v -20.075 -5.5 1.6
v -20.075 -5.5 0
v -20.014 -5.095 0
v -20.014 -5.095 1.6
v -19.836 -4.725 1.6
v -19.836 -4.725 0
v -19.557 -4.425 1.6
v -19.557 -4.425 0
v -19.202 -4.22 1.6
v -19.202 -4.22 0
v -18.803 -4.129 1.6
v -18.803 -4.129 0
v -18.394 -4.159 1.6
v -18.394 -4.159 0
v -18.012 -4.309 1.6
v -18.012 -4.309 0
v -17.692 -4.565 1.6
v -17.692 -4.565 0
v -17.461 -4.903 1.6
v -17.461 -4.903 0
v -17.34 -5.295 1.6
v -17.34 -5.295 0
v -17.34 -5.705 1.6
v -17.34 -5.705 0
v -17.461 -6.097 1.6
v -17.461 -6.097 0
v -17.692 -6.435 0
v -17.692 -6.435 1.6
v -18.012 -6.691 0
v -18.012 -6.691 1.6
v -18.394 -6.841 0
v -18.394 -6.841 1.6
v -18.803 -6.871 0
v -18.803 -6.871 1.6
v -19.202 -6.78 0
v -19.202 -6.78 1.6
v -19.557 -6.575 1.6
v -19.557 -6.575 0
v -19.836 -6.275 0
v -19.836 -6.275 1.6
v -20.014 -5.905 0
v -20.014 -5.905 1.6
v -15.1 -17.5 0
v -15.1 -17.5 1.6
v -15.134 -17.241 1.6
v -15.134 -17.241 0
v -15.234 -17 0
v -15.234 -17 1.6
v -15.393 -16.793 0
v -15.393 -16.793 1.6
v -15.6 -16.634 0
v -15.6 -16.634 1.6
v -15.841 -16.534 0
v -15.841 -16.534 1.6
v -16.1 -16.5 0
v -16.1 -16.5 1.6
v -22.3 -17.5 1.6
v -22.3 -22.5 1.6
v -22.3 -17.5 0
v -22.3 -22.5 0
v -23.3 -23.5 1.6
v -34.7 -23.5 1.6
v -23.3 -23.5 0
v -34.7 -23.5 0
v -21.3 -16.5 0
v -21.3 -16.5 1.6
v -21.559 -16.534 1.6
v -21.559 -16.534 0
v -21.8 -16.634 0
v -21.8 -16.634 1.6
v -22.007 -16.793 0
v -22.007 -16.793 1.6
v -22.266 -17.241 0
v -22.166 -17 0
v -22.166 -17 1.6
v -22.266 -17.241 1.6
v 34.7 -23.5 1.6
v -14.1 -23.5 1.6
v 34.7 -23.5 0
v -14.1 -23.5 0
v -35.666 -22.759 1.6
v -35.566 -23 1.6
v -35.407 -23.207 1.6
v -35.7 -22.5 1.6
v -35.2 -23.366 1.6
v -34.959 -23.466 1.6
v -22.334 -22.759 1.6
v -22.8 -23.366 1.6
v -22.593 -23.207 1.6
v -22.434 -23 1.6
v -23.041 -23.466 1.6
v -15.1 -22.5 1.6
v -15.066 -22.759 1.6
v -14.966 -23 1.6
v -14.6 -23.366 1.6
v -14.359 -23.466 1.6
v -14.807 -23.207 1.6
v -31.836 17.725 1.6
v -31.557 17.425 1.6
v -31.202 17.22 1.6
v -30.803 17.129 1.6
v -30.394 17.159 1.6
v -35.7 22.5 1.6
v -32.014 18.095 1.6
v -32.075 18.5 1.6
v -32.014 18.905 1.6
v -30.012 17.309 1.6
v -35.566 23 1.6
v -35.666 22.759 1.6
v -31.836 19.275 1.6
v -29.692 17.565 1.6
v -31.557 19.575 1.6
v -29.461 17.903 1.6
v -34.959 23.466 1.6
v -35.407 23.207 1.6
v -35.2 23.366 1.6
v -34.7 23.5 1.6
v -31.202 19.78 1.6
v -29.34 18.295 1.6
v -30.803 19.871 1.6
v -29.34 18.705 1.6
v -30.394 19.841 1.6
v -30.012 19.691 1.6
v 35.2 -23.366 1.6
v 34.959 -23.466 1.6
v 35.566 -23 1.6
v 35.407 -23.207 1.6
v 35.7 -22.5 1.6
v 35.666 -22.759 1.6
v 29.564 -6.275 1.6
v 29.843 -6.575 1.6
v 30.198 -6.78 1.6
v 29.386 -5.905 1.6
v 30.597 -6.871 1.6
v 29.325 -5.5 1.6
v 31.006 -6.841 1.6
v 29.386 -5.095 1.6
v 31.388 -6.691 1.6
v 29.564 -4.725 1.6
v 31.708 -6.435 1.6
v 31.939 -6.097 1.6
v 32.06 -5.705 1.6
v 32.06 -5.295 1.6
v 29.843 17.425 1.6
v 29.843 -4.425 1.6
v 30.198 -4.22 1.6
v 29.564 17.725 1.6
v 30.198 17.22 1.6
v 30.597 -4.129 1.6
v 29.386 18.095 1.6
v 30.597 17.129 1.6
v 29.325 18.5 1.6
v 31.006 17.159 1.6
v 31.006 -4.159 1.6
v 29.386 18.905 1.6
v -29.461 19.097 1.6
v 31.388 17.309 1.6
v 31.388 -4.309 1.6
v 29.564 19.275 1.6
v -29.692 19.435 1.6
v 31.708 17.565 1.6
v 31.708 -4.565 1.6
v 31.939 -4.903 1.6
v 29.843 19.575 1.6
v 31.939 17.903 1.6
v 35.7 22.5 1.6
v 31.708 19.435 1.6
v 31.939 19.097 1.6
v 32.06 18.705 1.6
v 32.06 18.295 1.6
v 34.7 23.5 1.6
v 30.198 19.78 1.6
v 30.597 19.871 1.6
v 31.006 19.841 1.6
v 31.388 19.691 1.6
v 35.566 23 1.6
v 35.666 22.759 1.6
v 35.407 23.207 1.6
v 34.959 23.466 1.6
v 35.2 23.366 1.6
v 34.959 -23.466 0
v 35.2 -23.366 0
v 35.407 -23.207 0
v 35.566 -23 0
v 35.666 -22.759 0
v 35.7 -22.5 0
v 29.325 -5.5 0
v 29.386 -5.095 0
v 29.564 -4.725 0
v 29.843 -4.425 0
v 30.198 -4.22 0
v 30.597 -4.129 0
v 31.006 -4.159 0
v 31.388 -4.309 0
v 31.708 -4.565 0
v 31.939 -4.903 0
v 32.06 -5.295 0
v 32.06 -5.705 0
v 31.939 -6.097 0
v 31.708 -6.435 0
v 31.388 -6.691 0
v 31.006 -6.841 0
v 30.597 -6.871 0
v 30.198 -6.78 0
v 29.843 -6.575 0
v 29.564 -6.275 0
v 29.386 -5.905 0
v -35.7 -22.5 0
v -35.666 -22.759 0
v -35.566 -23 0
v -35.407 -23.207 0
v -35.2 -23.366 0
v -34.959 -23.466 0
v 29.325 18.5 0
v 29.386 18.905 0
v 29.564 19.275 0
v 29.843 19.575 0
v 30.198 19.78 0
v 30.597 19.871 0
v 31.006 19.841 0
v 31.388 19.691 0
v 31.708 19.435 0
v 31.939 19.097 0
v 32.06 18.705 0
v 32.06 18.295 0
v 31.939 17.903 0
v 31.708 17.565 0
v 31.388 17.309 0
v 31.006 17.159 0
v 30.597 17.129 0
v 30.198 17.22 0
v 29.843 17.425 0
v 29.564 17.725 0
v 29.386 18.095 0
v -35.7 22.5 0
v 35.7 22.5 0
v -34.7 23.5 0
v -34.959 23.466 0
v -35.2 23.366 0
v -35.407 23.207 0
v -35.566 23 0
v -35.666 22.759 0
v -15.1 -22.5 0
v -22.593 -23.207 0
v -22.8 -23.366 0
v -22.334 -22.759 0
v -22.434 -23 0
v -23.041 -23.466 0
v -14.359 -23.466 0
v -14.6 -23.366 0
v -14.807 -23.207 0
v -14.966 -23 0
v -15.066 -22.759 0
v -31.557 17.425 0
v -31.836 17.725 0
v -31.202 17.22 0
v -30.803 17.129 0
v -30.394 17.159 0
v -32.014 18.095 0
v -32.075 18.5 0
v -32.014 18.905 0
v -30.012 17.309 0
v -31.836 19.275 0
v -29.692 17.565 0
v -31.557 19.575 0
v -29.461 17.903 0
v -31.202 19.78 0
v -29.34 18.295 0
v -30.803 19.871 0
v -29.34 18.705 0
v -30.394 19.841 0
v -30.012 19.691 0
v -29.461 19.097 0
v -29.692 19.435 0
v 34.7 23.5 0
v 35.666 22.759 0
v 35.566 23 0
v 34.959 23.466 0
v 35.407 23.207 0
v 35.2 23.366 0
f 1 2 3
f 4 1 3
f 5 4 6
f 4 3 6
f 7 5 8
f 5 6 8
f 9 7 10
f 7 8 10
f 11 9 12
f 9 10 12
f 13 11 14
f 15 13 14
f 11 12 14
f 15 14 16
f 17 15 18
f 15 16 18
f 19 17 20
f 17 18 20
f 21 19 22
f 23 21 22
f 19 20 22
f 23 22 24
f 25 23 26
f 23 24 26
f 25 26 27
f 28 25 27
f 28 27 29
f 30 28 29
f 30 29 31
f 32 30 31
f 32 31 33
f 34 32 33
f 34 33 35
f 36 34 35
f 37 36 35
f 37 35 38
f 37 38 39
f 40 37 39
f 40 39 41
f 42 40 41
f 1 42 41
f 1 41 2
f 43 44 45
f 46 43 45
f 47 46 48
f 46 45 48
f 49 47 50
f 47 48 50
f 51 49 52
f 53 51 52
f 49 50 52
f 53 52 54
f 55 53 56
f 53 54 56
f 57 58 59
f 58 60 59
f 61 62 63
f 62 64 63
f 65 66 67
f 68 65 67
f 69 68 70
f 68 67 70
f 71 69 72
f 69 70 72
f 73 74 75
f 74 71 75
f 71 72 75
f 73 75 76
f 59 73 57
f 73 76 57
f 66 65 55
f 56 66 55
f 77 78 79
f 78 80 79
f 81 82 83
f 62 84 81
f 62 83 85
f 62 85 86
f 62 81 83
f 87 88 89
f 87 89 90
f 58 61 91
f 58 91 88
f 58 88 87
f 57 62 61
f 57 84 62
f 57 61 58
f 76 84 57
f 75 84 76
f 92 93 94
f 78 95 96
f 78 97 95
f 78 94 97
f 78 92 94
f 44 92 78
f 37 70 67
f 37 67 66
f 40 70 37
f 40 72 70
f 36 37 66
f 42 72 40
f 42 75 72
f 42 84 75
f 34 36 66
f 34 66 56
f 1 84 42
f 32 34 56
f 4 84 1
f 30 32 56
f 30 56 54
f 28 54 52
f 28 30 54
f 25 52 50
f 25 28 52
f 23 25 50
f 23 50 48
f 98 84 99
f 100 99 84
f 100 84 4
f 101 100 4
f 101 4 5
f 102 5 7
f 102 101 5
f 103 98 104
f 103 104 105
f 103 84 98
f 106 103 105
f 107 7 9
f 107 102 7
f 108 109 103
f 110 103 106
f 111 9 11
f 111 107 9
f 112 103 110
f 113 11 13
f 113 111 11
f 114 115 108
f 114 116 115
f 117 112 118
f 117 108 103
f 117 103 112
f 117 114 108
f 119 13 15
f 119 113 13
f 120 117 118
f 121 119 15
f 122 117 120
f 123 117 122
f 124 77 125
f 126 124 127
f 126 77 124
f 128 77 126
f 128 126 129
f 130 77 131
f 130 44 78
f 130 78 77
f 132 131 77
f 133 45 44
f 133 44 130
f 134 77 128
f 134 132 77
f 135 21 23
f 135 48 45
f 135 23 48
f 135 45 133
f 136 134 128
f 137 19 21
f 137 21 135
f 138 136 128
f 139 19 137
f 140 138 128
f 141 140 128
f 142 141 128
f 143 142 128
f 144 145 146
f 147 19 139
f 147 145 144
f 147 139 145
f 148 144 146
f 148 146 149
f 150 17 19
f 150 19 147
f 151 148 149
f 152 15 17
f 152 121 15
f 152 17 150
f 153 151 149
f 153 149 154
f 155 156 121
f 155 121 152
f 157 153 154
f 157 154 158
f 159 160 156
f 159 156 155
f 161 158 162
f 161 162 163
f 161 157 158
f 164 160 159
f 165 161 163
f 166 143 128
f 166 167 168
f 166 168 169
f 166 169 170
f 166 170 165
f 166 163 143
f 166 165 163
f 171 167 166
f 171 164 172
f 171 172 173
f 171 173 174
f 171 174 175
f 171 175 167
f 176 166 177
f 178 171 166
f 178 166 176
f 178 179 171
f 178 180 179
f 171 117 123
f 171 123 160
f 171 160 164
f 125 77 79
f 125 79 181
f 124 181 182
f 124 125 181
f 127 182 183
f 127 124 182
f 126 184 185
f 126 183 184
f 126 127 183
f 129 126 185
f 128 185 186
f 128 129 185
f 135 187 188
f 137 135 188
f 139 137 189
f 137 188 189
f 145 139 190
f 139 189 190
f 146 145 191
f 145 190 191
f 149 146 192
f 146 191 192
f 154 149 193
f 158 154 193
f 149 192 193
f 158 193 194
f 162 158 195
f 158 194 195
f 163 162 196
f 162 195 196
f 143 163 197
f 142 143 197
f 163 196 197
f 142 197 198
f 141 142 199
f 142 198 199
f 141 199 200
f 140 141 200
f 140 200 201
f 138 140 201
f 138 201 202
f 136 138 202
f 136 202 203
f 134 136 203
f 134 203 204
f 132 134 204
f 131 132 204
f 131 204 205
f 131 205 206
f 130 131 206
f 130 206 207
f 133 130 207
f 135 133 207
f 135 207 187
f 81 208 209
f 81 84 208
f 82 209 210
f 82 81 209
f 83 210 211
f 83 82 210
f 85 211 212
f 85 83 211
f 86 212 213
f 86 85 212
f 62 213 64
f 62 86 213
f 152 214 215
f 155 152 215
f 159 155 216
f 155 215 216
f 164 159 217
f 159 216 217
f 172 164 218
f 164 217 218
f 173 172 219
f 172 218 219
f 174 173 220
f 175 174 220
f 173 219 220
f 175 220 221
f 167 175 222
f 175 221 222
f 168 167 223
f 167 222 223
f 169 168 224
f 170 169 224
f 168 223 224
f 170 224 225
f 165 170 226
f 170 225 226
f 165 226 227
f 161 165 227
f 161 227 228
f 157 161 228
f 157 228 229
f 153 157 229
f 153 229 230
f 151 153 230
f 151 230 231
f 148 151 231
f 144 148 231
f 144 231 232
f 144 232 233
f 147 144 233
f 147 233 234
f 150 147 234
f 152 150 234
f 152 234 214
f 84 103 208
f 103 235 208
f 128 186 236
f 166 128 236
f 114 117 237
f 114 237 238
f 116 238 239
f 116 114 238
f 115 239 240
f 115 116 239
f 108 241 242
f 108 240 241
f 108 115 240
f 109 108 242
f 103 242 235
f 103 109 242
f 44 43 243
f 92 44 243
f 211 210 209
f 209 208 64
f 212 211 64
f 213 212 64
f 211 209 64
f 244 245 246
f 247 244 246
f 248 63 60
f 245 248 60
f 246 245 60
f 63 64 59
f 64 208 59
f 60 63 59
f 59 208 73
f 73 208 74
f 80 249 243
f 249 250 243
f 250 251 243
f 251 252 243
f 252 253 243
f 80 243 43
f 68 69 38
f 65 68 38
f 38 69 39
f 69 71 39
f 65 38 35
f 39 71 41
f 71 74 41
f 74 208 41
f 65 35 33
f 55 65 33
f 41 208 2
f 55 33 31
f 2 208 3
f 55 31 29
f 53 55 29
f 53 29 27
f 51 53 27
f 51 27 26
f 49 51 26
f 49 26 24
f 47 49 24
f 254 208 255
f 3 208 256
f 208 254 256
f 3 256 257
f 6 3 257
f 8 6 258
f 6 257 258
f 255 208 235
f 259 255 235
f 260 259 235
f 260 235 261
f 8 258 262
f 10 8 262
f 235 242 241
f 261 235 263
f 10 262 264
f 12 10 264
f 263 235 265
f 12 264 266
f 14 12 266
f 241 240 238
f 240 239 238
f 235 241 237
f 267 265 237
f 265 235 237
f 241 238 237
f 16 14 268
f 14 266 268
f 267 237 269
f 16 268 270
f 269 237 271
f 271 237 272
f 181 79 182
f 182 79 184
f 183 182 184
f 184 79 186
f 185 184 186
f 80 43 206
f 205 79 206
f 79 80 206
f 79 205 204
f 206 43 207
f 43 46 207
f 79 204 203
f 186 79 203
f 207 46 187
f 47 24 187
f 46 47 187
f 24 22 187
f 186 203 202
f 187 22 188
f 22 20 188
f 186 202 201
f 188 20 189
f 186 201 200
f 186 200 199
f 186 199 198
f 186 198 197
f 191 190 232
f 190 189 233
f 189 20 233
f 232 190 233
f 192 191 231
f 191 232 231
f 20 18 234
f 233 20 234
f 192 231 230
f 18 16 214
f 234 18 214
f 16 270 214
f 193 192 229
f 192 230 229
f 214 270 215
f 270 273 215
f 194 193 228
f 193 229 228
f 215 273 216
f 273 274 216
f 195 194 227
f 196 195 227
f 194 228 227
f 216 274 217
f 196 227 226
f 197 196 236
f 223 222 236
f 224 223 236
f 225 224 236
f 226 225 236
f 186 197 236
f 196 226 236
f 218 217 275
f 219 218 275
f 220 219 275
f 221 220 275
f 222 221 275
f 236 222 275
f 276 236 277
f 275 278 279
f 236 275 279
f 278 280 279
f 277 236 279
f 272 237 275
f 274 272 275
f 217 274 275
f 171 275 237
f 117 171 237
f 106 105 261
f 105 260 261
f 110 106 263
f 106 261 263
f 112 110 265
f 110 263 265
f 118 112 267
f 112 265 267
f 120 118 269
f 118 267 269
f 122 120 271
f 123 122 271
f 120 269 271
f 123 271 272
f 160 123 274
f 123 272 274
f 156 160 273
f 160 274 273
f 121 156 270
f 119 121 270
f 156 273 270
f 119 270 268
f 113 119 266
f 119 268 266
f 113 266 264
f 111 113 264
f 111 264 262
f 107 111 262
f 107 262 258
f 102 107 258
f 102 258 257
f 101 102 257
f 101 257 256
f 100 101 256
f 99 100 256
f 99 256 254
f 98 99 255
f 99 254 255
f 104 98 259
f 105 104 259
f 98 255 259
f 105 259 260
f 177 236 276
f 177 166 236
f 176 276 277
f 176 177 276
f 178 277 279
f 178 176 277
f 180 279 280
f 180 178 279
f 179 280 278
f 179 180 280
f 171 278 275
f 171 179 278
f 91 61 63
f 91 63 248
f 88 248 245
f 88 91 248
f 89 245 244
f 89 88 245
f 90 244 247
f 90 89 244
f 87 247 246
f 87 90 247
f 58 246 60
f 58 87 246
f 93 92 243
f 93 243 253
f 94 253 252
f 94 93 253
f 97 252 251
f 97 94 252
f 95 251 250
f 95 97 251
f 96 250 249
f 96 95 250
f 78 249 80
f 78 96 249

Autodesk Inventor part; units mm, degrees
ref_plane "YZ Plane" through (0, 0, 0) normal (1, 0, 0) x (0, 1, 0)
ref_plane "XZ Plane" through (0, 0, 0) normal (0, 1, 0) x (-1, 0, 0)
ref_plane "XY Plane" through (0, 0, 0) normal (0, 0, 1) x (1, 0, 0)
sketch "Sketch1" plane through (0, 0, 0) normal (0, 0, 1) x (1, 0, 0)
  line L0 (-35.7, -23.5) -> (35.7, -23.5)
  line L1 (35.7, -23.5) -> (35.7, 23.5)
  line L2 (35.7, 23.5) -> (-35.7, 23.5)
  line L3 (-35.7, 23.5) -> (-35.7, -23.5)
  line L4 (-35.7, -23.5) -> (35.7, 23.5) construction
  line L5 (35.7, -23.5) -> (-35.7, 23.5) construction
  point P0 (0, 0)
  dimension "d0" = 47
  dimension "d1" = 71.4
extrude "Extrusion1" add sketch "Sketch1" along normal blind 1.6
sketch "Sketch2" plane through (0, 0, 0) normal (0, 0, -1) x (-1, 0, 0)
  line L0 (35.7, -23.5) -> (-35.7, -23.5) projected
  line L1 (35.7, -23.5) -> (-35.7, -23.5) projected
  line L2 (15.1, -23.5) -> (22.3, -23.5)
  line L3 (22.3, -23.5) -> (22.3, -16.5)
  line L4 (22.3, -16.5) -> (15.1, -16.5)
  line L5 (15.1, -16.5) -> (15.1, -23.5)
  line L6 (-35.7, -23.5) -> (-35.7, 23.5) projected
  point P0 (0, 0)
  dimension "d4" = 50.8
  dimension "d5" = 7.2
  dimension "d6" = 7
extrude "Extrusion2" cut sketch "Sketch2" against normal through all
sketch "Sketch3" plane through (0, 0, 0) normal (0, 0, -1) x (-1, 0, 0)
  circle A0 centre (30.7, 18.5) radius 1.375
  circle A1 centre (-30.7, -5.5) radius 1.375
  circle A2 centre (-30.7, 18.5) radius 1.375
  line L0 (35.7, 23.5) -> (35.7, -23.5) projected
  line L1 (-35.7, 23.5) -> (35.7, 23.5) projected
  line L2 (-35.7, -23.5) -> (-35.7, 23.5) projected
  line L3 (15.1, -23.5) -> (-35.7, -23.5) projected
  circle A3 centre (18.7, -5.5) radius 1.375
  line L4 (15.1, -23.5) -> (15.1, -16.5) projected
  line L5 (22.3, -16.5) -> (22.3, -23.5) projected
  point P0 (0, 0)
  dimension "d9" = 2.75
  dimension "d10" = 2.75
  dimension "d11" = 2.75
  dimension "d12" = 5
  dimension "d13" = 5
  dimension "d14" = 5
  dimension "d15" = 5
  dimension "d16" = 5
  dimension "d17" = 18
  dimension "d20" = 2.75
  dimension "d21" = 0
  dimension "d22" = 7.2
  dimension "d23" = 3.6
extrude "Extrusion3" cut sketch "Sketch3" against normal through all
fillet "Fillet1" radius 1 8 edges at (35.7, 23.5, 0.8) (-35.7, 23.5, 0.8) (-35.7, -23.5, 0.8) (-15.1, -23.5, 0.8) (-22.3, -23.5, 0.8) (-15.1, -16.5, 0.8) (-22.3, -16.5, 0.8) (35.7, -23.5, 0.8)
sketch "PWR_PCBA_OUTLINE" plane through (0, 0, 0) normal (0, 0, -1) x (-1, 0, 0)
  line L0 (16.1, -16.5) -> (21.3, -16.5) projected
  arc A0 (16.1, -16.5) -> (15.1, -17.5) centre (16.1, -17.5) ccw projected
  line L1 (15.1, -22.5) -> (15.1, -17.5) projected
  arc A1 (14.1, -23.5) -> (15.1, -22.5) centre (14.1, -22.5) ccw projected
  line L2 (14.1, -23.5) -> (-34.7, -23.5) projected
  arc A2 (-35.7, -22.5) -> (-34.7, -23.5) centre (-34.7, -22.5) ccw projected
  line L3 (-35.7, -22.5) -> (-35.7, 22.5) projected
  arc A3 (-34.7, 23.5) -> (-35.7, 22.5) centre (-34.7, 22.5) ccw projected
  line L4 (-34.7, 23.5) -> (34.7, 23.5) projected
  arc A4 (35.7, 22.5) -> (34.7, 23.5) centre (34.7, 22.5) ccw projected
  line L5 (35.7, 22.5) -> (35.7, -22.5) projected
  arc A5 (34.7, -23.5) -> (35.7, -22.5) centre (34.7, -22.5) ccw projected
  line L6 (34.7, -23.5) -> (23.3, -23.5) projected
  arc A6 (22.3, -22.5) -> (23.3, -23.5) centre (23.3, -22.5) ccw projected
  line L7 (22.3, -17.5) -> (22.3, -22.5) projected
  arc A7 (22.3, -17.5) -> (21.3, -16.5) centre (21.3, -17.5) ccw projected
  circle A8 centre (12.56, -19.5) radius 0.7937
  circle A9 centre (-33.16, -19.5) radius 0.7938
  line L8 (28.691, 15) -> (37.2, 15)
  line L9 (28.691, -10.908) -> (37.2, -10.908)
  line L10 (28.691, -10.908) -> (28.691, -10.4)
  line L11 (28.691, 14.492) -> (28.691, 15)
  line L12 (27.3702, 13.8697) -> (26.9638, 13.8697)
  line L13 (27.3702, 13.623) -> (27.3702, 13.8697)
  line L14 (27.3702, 13.623) -> (27.3702, 13.329)
  line L15 (27.3702, 13.0823) -> (27.3702, 13.329)
  line L16 (26.9638, 13.0823) -> (27.3702, 13.0823)
  line L17 (26.9638, 13.329) -> (26.9638, 13.0823)
  line L18 (26.9638, 13.329) -> (26.9638, 13.623)
  line L19 (26.9638, 13.8697) -> (26.9638, 13.623)
  line L20 (24.8302, -9.237) -> (24.8302, -9.531)
  line L21 (24.8302, -9.237) -> (24.8302, -8.9903)
  line L22 (24.8302, -8.9903) -> (24.4238, -8.9903)
  line L23 (24.4238, -8.9903) -> (24.4238, -9.237)
  line L24 (24.4238, -9.531) -> (24.4238, -9.237)
  line L25 (24.4238, -9.531) -> (24.4238, -9.7777)
  line L26 (24.4238, -9.7777) -> (24.8302, -9.7777)
  line L27 (24.8302, -9.7777) -> (24.8302, -9.531)
  circle A10 centre (24.627, -9.384) radius 0.2032
  circle A11 centre (27.167, 13.476) radius 0.2032
  circle A12 centre (18.7, -5.5) radius 1.375 projected
  circle A13 centre (30.7, 18.5) radius 1.375 projected
  circle A14 centre (-30.7, 18.5) radius 1.375 projected
  circle A15 centre (-30.7, -5.5) radius 1.375 projected
  circle A16 centre (-33.16, -13.5) radius 0.7938
  circle A17 centre (12.56, -13.5) radius 0.7937
  point P0 (0, 0)
  dimension "d29" = 0.7874
  dimension "d30" = 0.3937
  dimension "d31" = 0.3937
  dimension "d32" = 0.7874
equation "\"d10\" = d9"
equation "\"d11\" = d9"
equation "\"d13\" = d12"
equation "\"d14\" = d12"
equation "\"d15\" = d12"
equation "\"d16\" = d12"
equation "\"d20\" = d9"
equation "\"d23\" = 0.5 * d22"
equation "\"d30\" = 0.5 * d29"
equation "\"d31\" = 0.5 * d32"
properties part number "IO_HEADER_PCB"
